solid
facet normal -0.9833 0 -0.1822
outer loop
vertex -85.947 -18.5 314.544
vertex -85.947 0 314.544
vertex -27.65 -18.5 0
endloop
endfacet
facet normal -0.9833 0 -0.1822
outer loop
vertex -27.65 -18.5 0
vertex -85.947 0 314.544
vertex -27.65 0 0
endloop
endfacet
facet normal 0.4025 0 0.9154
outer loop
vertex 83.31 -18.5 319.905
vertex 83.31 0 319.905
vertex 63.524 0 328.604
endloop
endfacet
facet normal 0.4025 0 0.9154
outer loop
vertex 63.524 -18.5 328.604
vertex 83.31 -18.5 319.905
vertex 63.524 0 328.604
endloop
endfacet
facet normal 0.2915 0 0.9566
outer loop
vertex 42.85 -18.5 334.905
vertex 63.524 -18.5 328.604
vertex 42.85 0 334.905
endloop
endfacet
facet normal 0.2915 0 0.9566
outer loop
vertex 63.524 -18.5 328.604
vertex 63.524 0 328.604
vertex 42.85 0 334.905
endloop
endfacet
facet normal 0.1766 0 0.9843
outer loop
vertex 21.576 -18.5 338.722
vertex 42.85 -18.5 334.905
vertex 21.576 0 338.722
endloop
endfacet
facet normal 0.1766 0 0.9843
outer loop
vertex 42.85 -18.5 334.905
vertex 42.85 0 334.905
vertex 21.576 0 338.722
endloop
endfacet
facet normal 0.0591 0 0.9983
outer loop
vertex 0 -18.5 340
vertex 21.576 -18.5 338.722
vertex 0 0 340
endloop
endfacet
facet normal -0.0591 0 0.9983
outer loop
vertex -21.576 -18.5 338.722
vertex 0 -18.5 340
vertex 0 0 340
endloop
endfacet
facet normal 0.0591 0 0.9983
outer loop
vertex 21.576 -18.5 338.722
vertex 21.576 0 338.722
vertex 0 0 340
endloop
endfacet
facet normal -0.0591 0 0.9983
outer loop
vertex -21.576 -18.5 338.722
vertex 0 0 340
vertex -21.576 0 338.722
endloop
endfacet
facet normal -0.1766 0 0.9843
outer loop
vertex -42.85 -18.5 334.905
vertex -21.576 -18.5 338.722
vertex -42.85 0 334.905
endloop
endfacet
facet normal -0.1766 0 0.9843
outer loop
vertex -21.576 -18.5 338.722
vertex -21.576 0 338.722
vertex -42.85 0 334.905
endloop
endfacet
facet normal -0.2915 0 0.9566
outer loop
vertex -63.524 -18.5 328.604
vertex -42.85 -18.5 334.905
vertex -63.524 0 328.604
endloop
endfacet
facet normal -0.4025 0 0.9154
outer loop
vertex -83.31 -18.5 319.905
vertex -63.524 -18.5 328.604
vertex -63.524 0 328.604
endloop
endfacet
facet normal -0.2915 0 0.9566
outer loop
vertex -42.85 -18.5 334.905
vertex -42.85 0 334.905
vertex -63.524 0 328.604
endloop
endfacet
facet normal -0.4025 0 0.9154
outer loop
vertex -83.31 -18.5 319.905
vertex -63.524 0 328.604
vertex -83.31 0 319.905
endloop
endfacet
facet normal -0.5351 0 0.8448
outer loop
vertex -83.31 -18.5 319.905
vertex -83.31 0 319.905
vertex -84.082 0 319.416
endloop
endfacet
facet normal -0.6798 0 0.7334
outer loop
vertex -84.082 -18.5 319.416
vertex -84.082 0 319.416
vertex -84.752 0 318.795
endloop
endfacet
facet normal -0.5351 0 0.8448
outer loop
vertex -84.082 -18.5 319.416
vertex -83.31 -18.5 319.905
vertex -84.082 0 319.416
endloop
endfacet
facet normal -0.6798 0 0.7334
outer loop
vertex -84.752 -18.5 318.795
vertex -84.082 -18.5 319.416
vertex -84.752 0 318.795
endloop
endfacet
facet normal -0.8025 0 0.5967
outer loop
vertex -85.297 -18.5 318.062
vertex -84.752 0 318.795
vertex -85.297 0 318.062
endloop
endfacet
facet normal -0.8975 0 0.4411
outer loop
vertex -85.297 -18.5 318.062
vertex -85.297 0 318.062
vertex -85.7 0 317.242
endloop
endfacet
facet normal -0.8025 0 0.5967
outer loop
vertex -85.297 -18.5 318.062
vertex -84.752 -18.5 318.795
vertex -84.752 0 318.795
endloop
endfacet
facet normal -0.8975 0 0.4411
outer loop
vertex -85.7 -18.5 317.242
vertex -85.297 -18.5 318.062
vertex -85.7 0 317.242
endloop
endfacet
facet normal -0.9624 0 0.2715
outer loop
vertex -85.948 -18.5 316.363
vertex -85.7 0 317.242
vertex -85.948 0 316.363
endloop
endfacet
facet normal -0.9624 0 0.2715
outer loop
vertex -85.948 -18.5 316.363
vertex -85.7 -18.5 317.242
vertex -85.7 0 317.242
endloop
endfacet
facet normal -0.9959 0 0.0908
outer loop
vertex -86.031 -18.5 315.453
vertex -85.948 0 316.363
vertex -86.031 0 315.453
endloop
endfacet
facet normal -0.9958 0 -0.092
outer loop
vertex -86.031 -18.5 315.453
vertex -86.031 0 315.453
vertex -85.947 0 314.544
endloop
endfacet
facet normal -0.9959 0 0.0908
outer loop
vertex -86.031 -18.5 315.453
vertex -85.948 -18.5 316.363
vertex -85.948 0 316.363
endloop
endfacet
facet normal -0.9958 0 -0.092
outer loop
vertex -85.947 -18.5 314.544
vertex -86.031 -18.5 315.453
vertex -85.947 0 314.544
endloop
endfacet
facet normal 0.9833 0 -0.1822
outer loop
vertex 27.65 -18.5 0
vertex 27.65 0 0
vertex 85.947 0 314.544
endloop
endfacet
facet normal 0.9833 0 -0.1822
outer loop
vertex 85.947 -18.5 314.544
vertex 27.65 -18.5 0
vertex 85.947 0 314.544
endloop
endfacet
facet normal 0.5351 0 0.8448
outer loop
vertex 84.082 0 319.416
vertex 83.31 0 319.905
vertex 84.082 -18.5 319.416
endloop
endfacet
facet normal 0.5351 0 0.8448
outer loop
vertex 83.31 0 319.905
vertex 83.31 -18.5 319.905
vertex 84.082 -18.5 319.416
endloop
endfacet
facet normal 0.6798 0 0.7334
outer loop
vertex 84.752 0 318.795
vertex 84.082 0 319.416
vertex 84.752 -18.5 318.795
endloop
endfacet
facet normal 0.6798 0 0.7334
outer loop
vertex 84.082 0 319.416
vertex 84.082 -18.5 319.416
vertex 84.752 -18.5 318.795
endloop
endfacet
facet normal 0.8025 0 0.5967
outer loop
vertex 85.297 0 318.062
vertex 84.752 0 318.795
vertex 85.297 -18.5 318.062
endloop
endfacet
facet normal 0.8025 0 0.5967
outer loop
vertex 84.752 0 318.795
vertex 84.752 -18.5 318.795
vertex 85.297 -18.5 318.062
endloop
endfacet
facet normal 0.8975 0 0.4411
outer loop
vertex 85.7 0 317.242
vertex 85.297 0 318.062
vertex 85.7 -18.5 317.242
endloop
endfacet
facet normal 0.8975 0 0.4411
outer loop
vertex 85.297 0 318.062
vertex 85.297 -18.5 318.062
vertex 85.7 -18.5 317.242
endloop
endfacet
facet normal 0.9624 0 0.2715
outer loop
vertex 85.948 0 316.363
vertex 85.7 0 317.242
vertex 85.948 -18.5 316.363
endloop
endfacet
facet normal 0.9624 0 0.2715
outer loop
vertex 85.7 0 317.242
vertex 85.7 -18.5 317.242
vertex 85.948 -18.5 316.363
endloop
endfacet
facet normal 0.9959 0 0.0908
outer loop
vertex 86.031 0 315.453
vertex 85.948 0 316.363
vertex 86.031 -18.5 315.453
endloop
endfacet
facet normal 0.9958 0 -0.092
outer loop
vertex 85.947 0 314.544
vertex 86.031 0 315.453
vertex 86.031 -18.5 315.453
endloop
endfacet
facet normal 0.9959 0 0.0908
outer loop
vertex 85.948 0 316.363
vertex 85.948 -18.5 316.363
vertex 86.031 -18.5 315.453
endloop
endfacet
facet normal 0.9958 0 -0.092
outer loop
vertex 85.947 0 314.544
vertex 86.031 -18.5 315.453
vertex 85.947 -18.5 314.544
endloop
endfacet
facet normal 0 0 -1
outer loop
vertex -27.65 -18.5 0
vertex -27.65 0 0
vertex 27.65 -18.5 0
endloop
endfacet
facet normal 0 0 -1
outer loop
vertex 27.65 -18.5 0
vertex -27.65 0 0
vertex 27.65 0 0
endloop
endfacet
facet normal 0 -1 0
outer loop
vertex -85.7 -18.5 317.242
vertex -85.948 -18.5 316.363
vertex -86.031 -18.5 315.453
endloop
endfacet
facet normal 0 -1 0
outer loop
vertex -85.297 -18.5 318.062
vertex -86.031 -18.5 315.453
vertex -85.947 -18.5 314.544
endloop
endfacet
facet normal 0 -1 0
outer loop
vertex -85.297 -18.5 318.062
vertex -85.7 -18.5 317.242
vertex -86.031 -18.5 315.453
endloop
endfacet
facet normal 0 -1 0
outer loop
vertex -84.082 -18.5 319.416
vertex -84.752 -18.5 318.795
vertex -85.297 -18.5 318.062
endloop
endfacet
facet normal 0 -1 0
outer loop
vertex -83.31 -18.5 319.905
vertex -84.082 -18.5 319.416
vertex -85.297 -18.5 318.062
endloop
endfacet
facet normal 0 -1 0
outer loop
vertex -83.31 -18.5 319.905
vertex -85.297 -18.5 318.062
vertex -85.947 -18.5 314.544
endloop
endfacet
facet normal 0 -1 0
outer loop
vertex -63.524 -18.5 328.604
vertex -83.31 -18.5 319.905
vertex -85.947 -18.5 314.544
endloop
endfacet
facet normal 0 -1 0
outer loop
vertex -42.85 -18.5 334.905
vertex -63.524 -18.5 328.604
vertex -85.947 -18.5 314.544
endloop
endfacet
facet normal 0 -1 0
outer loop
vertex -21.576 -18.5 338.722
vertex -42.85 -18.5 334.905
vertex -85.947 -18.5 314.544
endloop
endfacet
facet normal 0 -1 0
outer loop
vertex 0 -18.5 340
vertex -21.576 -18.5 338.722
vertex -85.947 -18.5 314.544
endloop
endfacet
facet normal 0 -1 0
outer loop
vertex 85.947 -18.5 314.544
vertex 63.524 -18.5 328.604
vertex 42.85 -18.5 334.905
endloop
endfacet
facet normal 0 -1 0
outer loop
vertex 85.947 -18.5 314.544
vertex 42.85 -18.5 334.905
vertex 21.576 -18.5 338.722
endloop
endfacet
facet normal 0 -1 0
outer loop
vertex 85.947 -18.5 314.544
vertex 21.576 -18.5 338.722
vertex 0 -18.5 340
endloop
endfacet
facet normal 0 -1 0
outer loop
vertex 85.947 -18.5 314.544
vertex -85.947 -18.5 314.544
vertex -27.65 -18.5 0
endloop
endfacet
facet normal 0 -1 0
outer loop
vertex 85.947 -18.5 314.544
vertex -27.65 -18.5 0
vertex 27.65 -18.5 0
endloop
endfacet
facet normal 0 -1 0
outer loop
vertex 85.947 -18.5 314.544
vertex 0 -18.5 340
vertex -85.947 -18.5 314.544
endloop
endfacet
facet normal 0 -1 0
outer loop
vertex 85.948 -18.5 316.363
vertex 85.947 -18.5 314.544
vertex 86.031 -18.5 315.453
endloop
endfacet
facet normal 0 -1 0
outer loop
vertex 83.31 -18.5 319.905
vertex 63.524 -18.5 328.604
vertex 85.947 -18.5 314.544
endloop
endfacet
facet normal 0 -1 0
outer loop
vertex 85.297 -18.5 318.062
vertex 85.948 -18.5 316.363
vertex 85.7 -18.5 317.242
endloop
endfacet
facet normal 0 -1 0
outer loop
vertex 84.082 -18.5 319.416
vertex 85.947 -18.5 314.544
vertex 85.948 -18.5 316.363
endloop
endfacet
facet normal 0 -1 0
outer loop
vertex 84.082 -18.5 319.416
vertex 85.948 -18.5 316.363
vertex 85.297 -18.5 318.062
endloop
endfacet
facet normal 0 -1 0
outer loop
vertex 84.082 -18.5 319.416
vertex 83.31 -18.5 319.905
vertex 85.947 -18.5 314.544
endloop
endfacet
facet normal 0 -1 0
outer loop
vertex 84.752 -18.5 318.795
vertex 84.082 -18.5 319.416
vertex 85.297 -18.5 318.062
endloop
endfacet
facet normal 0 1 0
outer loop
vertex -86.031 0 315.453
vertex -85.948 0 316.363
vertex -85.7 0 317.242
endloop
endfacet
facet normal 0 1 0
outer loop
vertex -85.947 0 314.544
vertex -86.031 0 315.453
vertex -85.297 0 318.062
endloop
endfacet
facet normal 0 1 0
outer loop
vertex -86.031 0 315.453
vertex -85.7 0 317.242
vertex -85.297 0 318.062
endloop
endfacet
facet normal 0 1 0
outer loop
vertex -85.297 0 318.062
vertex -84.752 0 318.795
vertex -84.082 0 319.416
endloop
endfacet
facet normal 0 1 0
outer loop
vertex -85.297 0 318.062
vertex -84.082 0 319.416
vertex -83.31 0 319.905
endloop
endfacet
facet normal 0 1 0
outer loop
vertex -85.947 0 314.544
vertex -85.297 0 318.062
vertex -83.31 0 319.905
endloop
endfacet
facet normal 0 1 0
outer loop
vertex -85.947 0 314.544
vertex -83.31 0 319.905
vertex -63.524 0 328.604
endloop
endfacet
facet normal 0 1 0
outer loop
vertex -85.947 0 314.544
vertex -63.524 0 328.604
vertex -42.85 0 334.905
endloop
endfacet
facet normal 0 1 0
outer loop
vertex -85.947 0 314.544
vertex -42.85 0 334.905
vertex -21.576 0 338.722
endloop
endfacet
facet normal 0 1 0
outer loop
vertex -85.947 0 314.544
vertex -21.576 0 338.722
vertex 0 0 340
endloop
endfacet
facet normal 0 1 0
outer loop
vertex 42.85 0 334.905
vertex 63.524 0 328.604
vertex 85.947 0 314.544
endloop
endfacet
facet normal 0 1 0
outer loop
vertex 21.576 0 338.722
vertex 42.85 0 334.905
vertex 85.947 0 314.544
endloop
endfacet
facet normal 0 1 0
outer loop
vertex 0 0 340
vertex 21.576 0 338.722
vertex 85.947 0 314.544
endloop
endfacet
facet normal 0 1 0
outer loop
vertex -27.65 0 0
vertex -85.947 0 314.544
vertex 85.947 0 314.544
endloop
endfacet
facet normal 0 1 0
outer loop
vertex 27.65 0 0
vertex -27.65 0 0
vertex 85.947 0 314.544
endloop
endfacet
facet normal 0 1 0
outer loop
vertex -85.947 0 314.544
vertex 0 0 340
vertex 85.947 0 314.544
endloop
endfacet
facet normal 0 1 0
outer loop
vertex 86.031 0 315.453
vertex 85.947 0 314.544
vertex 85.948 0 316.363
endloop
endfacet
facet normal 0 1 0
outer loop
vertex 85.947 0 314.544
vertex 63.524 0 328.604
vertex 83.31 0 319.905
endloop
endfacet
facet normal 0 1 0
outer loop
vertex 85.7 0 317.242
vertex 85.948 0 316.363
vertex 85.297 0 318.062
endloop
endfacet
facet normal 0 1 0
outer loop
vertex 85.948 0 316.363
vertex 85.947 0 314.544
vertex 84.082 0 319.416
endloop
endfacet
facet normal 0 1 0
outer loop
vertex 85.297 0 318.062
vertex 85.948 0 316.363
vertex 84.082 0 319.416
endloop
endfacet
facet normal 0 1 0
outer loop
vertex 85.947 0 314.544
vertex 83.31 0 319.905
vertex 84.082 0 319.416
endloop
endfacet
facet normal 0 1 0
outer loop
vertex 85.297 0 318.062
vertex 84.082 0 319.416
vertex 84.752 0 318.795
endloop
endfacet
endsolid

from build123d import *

# Parameters (mm, degrees)
F1_DEPTH = 18.5
F2_R     = 5
F3_R     = 5


with BuildPart() as f1:
    # F0 (on Front) → F1 (new body)
    with BuildSketch(Plane.XZ):
        with BuildLine():
            Line((-27.65, 0), (27.65, 0))
            Line((27.65, 0), (86.618847, 318.167425))
            ThreePointArc((86.618847, 318.167425), (0, 340), (-86.618847, 318.167425))
            Line((-86.618847, 318.167425), (-27.65, 0))
        make_face()
    extrude(amount=F1_DEPTH)

    # F2
    f2_edges = [f1.edges().sort_by_distance(p)[0] for p in [
        (-86.618847, -9.25, 318.167425),
    ]]
    fillet(f2_edges, radius=F2_R)

    # F3
    f3_edges = [f1.edges().sort_by_distance(p)[0] for p in [
        (86.618847, -9.25, 318.167425),
    ]]
    fillet(f3_edges, radius=F3_R)


solid = f1.part
